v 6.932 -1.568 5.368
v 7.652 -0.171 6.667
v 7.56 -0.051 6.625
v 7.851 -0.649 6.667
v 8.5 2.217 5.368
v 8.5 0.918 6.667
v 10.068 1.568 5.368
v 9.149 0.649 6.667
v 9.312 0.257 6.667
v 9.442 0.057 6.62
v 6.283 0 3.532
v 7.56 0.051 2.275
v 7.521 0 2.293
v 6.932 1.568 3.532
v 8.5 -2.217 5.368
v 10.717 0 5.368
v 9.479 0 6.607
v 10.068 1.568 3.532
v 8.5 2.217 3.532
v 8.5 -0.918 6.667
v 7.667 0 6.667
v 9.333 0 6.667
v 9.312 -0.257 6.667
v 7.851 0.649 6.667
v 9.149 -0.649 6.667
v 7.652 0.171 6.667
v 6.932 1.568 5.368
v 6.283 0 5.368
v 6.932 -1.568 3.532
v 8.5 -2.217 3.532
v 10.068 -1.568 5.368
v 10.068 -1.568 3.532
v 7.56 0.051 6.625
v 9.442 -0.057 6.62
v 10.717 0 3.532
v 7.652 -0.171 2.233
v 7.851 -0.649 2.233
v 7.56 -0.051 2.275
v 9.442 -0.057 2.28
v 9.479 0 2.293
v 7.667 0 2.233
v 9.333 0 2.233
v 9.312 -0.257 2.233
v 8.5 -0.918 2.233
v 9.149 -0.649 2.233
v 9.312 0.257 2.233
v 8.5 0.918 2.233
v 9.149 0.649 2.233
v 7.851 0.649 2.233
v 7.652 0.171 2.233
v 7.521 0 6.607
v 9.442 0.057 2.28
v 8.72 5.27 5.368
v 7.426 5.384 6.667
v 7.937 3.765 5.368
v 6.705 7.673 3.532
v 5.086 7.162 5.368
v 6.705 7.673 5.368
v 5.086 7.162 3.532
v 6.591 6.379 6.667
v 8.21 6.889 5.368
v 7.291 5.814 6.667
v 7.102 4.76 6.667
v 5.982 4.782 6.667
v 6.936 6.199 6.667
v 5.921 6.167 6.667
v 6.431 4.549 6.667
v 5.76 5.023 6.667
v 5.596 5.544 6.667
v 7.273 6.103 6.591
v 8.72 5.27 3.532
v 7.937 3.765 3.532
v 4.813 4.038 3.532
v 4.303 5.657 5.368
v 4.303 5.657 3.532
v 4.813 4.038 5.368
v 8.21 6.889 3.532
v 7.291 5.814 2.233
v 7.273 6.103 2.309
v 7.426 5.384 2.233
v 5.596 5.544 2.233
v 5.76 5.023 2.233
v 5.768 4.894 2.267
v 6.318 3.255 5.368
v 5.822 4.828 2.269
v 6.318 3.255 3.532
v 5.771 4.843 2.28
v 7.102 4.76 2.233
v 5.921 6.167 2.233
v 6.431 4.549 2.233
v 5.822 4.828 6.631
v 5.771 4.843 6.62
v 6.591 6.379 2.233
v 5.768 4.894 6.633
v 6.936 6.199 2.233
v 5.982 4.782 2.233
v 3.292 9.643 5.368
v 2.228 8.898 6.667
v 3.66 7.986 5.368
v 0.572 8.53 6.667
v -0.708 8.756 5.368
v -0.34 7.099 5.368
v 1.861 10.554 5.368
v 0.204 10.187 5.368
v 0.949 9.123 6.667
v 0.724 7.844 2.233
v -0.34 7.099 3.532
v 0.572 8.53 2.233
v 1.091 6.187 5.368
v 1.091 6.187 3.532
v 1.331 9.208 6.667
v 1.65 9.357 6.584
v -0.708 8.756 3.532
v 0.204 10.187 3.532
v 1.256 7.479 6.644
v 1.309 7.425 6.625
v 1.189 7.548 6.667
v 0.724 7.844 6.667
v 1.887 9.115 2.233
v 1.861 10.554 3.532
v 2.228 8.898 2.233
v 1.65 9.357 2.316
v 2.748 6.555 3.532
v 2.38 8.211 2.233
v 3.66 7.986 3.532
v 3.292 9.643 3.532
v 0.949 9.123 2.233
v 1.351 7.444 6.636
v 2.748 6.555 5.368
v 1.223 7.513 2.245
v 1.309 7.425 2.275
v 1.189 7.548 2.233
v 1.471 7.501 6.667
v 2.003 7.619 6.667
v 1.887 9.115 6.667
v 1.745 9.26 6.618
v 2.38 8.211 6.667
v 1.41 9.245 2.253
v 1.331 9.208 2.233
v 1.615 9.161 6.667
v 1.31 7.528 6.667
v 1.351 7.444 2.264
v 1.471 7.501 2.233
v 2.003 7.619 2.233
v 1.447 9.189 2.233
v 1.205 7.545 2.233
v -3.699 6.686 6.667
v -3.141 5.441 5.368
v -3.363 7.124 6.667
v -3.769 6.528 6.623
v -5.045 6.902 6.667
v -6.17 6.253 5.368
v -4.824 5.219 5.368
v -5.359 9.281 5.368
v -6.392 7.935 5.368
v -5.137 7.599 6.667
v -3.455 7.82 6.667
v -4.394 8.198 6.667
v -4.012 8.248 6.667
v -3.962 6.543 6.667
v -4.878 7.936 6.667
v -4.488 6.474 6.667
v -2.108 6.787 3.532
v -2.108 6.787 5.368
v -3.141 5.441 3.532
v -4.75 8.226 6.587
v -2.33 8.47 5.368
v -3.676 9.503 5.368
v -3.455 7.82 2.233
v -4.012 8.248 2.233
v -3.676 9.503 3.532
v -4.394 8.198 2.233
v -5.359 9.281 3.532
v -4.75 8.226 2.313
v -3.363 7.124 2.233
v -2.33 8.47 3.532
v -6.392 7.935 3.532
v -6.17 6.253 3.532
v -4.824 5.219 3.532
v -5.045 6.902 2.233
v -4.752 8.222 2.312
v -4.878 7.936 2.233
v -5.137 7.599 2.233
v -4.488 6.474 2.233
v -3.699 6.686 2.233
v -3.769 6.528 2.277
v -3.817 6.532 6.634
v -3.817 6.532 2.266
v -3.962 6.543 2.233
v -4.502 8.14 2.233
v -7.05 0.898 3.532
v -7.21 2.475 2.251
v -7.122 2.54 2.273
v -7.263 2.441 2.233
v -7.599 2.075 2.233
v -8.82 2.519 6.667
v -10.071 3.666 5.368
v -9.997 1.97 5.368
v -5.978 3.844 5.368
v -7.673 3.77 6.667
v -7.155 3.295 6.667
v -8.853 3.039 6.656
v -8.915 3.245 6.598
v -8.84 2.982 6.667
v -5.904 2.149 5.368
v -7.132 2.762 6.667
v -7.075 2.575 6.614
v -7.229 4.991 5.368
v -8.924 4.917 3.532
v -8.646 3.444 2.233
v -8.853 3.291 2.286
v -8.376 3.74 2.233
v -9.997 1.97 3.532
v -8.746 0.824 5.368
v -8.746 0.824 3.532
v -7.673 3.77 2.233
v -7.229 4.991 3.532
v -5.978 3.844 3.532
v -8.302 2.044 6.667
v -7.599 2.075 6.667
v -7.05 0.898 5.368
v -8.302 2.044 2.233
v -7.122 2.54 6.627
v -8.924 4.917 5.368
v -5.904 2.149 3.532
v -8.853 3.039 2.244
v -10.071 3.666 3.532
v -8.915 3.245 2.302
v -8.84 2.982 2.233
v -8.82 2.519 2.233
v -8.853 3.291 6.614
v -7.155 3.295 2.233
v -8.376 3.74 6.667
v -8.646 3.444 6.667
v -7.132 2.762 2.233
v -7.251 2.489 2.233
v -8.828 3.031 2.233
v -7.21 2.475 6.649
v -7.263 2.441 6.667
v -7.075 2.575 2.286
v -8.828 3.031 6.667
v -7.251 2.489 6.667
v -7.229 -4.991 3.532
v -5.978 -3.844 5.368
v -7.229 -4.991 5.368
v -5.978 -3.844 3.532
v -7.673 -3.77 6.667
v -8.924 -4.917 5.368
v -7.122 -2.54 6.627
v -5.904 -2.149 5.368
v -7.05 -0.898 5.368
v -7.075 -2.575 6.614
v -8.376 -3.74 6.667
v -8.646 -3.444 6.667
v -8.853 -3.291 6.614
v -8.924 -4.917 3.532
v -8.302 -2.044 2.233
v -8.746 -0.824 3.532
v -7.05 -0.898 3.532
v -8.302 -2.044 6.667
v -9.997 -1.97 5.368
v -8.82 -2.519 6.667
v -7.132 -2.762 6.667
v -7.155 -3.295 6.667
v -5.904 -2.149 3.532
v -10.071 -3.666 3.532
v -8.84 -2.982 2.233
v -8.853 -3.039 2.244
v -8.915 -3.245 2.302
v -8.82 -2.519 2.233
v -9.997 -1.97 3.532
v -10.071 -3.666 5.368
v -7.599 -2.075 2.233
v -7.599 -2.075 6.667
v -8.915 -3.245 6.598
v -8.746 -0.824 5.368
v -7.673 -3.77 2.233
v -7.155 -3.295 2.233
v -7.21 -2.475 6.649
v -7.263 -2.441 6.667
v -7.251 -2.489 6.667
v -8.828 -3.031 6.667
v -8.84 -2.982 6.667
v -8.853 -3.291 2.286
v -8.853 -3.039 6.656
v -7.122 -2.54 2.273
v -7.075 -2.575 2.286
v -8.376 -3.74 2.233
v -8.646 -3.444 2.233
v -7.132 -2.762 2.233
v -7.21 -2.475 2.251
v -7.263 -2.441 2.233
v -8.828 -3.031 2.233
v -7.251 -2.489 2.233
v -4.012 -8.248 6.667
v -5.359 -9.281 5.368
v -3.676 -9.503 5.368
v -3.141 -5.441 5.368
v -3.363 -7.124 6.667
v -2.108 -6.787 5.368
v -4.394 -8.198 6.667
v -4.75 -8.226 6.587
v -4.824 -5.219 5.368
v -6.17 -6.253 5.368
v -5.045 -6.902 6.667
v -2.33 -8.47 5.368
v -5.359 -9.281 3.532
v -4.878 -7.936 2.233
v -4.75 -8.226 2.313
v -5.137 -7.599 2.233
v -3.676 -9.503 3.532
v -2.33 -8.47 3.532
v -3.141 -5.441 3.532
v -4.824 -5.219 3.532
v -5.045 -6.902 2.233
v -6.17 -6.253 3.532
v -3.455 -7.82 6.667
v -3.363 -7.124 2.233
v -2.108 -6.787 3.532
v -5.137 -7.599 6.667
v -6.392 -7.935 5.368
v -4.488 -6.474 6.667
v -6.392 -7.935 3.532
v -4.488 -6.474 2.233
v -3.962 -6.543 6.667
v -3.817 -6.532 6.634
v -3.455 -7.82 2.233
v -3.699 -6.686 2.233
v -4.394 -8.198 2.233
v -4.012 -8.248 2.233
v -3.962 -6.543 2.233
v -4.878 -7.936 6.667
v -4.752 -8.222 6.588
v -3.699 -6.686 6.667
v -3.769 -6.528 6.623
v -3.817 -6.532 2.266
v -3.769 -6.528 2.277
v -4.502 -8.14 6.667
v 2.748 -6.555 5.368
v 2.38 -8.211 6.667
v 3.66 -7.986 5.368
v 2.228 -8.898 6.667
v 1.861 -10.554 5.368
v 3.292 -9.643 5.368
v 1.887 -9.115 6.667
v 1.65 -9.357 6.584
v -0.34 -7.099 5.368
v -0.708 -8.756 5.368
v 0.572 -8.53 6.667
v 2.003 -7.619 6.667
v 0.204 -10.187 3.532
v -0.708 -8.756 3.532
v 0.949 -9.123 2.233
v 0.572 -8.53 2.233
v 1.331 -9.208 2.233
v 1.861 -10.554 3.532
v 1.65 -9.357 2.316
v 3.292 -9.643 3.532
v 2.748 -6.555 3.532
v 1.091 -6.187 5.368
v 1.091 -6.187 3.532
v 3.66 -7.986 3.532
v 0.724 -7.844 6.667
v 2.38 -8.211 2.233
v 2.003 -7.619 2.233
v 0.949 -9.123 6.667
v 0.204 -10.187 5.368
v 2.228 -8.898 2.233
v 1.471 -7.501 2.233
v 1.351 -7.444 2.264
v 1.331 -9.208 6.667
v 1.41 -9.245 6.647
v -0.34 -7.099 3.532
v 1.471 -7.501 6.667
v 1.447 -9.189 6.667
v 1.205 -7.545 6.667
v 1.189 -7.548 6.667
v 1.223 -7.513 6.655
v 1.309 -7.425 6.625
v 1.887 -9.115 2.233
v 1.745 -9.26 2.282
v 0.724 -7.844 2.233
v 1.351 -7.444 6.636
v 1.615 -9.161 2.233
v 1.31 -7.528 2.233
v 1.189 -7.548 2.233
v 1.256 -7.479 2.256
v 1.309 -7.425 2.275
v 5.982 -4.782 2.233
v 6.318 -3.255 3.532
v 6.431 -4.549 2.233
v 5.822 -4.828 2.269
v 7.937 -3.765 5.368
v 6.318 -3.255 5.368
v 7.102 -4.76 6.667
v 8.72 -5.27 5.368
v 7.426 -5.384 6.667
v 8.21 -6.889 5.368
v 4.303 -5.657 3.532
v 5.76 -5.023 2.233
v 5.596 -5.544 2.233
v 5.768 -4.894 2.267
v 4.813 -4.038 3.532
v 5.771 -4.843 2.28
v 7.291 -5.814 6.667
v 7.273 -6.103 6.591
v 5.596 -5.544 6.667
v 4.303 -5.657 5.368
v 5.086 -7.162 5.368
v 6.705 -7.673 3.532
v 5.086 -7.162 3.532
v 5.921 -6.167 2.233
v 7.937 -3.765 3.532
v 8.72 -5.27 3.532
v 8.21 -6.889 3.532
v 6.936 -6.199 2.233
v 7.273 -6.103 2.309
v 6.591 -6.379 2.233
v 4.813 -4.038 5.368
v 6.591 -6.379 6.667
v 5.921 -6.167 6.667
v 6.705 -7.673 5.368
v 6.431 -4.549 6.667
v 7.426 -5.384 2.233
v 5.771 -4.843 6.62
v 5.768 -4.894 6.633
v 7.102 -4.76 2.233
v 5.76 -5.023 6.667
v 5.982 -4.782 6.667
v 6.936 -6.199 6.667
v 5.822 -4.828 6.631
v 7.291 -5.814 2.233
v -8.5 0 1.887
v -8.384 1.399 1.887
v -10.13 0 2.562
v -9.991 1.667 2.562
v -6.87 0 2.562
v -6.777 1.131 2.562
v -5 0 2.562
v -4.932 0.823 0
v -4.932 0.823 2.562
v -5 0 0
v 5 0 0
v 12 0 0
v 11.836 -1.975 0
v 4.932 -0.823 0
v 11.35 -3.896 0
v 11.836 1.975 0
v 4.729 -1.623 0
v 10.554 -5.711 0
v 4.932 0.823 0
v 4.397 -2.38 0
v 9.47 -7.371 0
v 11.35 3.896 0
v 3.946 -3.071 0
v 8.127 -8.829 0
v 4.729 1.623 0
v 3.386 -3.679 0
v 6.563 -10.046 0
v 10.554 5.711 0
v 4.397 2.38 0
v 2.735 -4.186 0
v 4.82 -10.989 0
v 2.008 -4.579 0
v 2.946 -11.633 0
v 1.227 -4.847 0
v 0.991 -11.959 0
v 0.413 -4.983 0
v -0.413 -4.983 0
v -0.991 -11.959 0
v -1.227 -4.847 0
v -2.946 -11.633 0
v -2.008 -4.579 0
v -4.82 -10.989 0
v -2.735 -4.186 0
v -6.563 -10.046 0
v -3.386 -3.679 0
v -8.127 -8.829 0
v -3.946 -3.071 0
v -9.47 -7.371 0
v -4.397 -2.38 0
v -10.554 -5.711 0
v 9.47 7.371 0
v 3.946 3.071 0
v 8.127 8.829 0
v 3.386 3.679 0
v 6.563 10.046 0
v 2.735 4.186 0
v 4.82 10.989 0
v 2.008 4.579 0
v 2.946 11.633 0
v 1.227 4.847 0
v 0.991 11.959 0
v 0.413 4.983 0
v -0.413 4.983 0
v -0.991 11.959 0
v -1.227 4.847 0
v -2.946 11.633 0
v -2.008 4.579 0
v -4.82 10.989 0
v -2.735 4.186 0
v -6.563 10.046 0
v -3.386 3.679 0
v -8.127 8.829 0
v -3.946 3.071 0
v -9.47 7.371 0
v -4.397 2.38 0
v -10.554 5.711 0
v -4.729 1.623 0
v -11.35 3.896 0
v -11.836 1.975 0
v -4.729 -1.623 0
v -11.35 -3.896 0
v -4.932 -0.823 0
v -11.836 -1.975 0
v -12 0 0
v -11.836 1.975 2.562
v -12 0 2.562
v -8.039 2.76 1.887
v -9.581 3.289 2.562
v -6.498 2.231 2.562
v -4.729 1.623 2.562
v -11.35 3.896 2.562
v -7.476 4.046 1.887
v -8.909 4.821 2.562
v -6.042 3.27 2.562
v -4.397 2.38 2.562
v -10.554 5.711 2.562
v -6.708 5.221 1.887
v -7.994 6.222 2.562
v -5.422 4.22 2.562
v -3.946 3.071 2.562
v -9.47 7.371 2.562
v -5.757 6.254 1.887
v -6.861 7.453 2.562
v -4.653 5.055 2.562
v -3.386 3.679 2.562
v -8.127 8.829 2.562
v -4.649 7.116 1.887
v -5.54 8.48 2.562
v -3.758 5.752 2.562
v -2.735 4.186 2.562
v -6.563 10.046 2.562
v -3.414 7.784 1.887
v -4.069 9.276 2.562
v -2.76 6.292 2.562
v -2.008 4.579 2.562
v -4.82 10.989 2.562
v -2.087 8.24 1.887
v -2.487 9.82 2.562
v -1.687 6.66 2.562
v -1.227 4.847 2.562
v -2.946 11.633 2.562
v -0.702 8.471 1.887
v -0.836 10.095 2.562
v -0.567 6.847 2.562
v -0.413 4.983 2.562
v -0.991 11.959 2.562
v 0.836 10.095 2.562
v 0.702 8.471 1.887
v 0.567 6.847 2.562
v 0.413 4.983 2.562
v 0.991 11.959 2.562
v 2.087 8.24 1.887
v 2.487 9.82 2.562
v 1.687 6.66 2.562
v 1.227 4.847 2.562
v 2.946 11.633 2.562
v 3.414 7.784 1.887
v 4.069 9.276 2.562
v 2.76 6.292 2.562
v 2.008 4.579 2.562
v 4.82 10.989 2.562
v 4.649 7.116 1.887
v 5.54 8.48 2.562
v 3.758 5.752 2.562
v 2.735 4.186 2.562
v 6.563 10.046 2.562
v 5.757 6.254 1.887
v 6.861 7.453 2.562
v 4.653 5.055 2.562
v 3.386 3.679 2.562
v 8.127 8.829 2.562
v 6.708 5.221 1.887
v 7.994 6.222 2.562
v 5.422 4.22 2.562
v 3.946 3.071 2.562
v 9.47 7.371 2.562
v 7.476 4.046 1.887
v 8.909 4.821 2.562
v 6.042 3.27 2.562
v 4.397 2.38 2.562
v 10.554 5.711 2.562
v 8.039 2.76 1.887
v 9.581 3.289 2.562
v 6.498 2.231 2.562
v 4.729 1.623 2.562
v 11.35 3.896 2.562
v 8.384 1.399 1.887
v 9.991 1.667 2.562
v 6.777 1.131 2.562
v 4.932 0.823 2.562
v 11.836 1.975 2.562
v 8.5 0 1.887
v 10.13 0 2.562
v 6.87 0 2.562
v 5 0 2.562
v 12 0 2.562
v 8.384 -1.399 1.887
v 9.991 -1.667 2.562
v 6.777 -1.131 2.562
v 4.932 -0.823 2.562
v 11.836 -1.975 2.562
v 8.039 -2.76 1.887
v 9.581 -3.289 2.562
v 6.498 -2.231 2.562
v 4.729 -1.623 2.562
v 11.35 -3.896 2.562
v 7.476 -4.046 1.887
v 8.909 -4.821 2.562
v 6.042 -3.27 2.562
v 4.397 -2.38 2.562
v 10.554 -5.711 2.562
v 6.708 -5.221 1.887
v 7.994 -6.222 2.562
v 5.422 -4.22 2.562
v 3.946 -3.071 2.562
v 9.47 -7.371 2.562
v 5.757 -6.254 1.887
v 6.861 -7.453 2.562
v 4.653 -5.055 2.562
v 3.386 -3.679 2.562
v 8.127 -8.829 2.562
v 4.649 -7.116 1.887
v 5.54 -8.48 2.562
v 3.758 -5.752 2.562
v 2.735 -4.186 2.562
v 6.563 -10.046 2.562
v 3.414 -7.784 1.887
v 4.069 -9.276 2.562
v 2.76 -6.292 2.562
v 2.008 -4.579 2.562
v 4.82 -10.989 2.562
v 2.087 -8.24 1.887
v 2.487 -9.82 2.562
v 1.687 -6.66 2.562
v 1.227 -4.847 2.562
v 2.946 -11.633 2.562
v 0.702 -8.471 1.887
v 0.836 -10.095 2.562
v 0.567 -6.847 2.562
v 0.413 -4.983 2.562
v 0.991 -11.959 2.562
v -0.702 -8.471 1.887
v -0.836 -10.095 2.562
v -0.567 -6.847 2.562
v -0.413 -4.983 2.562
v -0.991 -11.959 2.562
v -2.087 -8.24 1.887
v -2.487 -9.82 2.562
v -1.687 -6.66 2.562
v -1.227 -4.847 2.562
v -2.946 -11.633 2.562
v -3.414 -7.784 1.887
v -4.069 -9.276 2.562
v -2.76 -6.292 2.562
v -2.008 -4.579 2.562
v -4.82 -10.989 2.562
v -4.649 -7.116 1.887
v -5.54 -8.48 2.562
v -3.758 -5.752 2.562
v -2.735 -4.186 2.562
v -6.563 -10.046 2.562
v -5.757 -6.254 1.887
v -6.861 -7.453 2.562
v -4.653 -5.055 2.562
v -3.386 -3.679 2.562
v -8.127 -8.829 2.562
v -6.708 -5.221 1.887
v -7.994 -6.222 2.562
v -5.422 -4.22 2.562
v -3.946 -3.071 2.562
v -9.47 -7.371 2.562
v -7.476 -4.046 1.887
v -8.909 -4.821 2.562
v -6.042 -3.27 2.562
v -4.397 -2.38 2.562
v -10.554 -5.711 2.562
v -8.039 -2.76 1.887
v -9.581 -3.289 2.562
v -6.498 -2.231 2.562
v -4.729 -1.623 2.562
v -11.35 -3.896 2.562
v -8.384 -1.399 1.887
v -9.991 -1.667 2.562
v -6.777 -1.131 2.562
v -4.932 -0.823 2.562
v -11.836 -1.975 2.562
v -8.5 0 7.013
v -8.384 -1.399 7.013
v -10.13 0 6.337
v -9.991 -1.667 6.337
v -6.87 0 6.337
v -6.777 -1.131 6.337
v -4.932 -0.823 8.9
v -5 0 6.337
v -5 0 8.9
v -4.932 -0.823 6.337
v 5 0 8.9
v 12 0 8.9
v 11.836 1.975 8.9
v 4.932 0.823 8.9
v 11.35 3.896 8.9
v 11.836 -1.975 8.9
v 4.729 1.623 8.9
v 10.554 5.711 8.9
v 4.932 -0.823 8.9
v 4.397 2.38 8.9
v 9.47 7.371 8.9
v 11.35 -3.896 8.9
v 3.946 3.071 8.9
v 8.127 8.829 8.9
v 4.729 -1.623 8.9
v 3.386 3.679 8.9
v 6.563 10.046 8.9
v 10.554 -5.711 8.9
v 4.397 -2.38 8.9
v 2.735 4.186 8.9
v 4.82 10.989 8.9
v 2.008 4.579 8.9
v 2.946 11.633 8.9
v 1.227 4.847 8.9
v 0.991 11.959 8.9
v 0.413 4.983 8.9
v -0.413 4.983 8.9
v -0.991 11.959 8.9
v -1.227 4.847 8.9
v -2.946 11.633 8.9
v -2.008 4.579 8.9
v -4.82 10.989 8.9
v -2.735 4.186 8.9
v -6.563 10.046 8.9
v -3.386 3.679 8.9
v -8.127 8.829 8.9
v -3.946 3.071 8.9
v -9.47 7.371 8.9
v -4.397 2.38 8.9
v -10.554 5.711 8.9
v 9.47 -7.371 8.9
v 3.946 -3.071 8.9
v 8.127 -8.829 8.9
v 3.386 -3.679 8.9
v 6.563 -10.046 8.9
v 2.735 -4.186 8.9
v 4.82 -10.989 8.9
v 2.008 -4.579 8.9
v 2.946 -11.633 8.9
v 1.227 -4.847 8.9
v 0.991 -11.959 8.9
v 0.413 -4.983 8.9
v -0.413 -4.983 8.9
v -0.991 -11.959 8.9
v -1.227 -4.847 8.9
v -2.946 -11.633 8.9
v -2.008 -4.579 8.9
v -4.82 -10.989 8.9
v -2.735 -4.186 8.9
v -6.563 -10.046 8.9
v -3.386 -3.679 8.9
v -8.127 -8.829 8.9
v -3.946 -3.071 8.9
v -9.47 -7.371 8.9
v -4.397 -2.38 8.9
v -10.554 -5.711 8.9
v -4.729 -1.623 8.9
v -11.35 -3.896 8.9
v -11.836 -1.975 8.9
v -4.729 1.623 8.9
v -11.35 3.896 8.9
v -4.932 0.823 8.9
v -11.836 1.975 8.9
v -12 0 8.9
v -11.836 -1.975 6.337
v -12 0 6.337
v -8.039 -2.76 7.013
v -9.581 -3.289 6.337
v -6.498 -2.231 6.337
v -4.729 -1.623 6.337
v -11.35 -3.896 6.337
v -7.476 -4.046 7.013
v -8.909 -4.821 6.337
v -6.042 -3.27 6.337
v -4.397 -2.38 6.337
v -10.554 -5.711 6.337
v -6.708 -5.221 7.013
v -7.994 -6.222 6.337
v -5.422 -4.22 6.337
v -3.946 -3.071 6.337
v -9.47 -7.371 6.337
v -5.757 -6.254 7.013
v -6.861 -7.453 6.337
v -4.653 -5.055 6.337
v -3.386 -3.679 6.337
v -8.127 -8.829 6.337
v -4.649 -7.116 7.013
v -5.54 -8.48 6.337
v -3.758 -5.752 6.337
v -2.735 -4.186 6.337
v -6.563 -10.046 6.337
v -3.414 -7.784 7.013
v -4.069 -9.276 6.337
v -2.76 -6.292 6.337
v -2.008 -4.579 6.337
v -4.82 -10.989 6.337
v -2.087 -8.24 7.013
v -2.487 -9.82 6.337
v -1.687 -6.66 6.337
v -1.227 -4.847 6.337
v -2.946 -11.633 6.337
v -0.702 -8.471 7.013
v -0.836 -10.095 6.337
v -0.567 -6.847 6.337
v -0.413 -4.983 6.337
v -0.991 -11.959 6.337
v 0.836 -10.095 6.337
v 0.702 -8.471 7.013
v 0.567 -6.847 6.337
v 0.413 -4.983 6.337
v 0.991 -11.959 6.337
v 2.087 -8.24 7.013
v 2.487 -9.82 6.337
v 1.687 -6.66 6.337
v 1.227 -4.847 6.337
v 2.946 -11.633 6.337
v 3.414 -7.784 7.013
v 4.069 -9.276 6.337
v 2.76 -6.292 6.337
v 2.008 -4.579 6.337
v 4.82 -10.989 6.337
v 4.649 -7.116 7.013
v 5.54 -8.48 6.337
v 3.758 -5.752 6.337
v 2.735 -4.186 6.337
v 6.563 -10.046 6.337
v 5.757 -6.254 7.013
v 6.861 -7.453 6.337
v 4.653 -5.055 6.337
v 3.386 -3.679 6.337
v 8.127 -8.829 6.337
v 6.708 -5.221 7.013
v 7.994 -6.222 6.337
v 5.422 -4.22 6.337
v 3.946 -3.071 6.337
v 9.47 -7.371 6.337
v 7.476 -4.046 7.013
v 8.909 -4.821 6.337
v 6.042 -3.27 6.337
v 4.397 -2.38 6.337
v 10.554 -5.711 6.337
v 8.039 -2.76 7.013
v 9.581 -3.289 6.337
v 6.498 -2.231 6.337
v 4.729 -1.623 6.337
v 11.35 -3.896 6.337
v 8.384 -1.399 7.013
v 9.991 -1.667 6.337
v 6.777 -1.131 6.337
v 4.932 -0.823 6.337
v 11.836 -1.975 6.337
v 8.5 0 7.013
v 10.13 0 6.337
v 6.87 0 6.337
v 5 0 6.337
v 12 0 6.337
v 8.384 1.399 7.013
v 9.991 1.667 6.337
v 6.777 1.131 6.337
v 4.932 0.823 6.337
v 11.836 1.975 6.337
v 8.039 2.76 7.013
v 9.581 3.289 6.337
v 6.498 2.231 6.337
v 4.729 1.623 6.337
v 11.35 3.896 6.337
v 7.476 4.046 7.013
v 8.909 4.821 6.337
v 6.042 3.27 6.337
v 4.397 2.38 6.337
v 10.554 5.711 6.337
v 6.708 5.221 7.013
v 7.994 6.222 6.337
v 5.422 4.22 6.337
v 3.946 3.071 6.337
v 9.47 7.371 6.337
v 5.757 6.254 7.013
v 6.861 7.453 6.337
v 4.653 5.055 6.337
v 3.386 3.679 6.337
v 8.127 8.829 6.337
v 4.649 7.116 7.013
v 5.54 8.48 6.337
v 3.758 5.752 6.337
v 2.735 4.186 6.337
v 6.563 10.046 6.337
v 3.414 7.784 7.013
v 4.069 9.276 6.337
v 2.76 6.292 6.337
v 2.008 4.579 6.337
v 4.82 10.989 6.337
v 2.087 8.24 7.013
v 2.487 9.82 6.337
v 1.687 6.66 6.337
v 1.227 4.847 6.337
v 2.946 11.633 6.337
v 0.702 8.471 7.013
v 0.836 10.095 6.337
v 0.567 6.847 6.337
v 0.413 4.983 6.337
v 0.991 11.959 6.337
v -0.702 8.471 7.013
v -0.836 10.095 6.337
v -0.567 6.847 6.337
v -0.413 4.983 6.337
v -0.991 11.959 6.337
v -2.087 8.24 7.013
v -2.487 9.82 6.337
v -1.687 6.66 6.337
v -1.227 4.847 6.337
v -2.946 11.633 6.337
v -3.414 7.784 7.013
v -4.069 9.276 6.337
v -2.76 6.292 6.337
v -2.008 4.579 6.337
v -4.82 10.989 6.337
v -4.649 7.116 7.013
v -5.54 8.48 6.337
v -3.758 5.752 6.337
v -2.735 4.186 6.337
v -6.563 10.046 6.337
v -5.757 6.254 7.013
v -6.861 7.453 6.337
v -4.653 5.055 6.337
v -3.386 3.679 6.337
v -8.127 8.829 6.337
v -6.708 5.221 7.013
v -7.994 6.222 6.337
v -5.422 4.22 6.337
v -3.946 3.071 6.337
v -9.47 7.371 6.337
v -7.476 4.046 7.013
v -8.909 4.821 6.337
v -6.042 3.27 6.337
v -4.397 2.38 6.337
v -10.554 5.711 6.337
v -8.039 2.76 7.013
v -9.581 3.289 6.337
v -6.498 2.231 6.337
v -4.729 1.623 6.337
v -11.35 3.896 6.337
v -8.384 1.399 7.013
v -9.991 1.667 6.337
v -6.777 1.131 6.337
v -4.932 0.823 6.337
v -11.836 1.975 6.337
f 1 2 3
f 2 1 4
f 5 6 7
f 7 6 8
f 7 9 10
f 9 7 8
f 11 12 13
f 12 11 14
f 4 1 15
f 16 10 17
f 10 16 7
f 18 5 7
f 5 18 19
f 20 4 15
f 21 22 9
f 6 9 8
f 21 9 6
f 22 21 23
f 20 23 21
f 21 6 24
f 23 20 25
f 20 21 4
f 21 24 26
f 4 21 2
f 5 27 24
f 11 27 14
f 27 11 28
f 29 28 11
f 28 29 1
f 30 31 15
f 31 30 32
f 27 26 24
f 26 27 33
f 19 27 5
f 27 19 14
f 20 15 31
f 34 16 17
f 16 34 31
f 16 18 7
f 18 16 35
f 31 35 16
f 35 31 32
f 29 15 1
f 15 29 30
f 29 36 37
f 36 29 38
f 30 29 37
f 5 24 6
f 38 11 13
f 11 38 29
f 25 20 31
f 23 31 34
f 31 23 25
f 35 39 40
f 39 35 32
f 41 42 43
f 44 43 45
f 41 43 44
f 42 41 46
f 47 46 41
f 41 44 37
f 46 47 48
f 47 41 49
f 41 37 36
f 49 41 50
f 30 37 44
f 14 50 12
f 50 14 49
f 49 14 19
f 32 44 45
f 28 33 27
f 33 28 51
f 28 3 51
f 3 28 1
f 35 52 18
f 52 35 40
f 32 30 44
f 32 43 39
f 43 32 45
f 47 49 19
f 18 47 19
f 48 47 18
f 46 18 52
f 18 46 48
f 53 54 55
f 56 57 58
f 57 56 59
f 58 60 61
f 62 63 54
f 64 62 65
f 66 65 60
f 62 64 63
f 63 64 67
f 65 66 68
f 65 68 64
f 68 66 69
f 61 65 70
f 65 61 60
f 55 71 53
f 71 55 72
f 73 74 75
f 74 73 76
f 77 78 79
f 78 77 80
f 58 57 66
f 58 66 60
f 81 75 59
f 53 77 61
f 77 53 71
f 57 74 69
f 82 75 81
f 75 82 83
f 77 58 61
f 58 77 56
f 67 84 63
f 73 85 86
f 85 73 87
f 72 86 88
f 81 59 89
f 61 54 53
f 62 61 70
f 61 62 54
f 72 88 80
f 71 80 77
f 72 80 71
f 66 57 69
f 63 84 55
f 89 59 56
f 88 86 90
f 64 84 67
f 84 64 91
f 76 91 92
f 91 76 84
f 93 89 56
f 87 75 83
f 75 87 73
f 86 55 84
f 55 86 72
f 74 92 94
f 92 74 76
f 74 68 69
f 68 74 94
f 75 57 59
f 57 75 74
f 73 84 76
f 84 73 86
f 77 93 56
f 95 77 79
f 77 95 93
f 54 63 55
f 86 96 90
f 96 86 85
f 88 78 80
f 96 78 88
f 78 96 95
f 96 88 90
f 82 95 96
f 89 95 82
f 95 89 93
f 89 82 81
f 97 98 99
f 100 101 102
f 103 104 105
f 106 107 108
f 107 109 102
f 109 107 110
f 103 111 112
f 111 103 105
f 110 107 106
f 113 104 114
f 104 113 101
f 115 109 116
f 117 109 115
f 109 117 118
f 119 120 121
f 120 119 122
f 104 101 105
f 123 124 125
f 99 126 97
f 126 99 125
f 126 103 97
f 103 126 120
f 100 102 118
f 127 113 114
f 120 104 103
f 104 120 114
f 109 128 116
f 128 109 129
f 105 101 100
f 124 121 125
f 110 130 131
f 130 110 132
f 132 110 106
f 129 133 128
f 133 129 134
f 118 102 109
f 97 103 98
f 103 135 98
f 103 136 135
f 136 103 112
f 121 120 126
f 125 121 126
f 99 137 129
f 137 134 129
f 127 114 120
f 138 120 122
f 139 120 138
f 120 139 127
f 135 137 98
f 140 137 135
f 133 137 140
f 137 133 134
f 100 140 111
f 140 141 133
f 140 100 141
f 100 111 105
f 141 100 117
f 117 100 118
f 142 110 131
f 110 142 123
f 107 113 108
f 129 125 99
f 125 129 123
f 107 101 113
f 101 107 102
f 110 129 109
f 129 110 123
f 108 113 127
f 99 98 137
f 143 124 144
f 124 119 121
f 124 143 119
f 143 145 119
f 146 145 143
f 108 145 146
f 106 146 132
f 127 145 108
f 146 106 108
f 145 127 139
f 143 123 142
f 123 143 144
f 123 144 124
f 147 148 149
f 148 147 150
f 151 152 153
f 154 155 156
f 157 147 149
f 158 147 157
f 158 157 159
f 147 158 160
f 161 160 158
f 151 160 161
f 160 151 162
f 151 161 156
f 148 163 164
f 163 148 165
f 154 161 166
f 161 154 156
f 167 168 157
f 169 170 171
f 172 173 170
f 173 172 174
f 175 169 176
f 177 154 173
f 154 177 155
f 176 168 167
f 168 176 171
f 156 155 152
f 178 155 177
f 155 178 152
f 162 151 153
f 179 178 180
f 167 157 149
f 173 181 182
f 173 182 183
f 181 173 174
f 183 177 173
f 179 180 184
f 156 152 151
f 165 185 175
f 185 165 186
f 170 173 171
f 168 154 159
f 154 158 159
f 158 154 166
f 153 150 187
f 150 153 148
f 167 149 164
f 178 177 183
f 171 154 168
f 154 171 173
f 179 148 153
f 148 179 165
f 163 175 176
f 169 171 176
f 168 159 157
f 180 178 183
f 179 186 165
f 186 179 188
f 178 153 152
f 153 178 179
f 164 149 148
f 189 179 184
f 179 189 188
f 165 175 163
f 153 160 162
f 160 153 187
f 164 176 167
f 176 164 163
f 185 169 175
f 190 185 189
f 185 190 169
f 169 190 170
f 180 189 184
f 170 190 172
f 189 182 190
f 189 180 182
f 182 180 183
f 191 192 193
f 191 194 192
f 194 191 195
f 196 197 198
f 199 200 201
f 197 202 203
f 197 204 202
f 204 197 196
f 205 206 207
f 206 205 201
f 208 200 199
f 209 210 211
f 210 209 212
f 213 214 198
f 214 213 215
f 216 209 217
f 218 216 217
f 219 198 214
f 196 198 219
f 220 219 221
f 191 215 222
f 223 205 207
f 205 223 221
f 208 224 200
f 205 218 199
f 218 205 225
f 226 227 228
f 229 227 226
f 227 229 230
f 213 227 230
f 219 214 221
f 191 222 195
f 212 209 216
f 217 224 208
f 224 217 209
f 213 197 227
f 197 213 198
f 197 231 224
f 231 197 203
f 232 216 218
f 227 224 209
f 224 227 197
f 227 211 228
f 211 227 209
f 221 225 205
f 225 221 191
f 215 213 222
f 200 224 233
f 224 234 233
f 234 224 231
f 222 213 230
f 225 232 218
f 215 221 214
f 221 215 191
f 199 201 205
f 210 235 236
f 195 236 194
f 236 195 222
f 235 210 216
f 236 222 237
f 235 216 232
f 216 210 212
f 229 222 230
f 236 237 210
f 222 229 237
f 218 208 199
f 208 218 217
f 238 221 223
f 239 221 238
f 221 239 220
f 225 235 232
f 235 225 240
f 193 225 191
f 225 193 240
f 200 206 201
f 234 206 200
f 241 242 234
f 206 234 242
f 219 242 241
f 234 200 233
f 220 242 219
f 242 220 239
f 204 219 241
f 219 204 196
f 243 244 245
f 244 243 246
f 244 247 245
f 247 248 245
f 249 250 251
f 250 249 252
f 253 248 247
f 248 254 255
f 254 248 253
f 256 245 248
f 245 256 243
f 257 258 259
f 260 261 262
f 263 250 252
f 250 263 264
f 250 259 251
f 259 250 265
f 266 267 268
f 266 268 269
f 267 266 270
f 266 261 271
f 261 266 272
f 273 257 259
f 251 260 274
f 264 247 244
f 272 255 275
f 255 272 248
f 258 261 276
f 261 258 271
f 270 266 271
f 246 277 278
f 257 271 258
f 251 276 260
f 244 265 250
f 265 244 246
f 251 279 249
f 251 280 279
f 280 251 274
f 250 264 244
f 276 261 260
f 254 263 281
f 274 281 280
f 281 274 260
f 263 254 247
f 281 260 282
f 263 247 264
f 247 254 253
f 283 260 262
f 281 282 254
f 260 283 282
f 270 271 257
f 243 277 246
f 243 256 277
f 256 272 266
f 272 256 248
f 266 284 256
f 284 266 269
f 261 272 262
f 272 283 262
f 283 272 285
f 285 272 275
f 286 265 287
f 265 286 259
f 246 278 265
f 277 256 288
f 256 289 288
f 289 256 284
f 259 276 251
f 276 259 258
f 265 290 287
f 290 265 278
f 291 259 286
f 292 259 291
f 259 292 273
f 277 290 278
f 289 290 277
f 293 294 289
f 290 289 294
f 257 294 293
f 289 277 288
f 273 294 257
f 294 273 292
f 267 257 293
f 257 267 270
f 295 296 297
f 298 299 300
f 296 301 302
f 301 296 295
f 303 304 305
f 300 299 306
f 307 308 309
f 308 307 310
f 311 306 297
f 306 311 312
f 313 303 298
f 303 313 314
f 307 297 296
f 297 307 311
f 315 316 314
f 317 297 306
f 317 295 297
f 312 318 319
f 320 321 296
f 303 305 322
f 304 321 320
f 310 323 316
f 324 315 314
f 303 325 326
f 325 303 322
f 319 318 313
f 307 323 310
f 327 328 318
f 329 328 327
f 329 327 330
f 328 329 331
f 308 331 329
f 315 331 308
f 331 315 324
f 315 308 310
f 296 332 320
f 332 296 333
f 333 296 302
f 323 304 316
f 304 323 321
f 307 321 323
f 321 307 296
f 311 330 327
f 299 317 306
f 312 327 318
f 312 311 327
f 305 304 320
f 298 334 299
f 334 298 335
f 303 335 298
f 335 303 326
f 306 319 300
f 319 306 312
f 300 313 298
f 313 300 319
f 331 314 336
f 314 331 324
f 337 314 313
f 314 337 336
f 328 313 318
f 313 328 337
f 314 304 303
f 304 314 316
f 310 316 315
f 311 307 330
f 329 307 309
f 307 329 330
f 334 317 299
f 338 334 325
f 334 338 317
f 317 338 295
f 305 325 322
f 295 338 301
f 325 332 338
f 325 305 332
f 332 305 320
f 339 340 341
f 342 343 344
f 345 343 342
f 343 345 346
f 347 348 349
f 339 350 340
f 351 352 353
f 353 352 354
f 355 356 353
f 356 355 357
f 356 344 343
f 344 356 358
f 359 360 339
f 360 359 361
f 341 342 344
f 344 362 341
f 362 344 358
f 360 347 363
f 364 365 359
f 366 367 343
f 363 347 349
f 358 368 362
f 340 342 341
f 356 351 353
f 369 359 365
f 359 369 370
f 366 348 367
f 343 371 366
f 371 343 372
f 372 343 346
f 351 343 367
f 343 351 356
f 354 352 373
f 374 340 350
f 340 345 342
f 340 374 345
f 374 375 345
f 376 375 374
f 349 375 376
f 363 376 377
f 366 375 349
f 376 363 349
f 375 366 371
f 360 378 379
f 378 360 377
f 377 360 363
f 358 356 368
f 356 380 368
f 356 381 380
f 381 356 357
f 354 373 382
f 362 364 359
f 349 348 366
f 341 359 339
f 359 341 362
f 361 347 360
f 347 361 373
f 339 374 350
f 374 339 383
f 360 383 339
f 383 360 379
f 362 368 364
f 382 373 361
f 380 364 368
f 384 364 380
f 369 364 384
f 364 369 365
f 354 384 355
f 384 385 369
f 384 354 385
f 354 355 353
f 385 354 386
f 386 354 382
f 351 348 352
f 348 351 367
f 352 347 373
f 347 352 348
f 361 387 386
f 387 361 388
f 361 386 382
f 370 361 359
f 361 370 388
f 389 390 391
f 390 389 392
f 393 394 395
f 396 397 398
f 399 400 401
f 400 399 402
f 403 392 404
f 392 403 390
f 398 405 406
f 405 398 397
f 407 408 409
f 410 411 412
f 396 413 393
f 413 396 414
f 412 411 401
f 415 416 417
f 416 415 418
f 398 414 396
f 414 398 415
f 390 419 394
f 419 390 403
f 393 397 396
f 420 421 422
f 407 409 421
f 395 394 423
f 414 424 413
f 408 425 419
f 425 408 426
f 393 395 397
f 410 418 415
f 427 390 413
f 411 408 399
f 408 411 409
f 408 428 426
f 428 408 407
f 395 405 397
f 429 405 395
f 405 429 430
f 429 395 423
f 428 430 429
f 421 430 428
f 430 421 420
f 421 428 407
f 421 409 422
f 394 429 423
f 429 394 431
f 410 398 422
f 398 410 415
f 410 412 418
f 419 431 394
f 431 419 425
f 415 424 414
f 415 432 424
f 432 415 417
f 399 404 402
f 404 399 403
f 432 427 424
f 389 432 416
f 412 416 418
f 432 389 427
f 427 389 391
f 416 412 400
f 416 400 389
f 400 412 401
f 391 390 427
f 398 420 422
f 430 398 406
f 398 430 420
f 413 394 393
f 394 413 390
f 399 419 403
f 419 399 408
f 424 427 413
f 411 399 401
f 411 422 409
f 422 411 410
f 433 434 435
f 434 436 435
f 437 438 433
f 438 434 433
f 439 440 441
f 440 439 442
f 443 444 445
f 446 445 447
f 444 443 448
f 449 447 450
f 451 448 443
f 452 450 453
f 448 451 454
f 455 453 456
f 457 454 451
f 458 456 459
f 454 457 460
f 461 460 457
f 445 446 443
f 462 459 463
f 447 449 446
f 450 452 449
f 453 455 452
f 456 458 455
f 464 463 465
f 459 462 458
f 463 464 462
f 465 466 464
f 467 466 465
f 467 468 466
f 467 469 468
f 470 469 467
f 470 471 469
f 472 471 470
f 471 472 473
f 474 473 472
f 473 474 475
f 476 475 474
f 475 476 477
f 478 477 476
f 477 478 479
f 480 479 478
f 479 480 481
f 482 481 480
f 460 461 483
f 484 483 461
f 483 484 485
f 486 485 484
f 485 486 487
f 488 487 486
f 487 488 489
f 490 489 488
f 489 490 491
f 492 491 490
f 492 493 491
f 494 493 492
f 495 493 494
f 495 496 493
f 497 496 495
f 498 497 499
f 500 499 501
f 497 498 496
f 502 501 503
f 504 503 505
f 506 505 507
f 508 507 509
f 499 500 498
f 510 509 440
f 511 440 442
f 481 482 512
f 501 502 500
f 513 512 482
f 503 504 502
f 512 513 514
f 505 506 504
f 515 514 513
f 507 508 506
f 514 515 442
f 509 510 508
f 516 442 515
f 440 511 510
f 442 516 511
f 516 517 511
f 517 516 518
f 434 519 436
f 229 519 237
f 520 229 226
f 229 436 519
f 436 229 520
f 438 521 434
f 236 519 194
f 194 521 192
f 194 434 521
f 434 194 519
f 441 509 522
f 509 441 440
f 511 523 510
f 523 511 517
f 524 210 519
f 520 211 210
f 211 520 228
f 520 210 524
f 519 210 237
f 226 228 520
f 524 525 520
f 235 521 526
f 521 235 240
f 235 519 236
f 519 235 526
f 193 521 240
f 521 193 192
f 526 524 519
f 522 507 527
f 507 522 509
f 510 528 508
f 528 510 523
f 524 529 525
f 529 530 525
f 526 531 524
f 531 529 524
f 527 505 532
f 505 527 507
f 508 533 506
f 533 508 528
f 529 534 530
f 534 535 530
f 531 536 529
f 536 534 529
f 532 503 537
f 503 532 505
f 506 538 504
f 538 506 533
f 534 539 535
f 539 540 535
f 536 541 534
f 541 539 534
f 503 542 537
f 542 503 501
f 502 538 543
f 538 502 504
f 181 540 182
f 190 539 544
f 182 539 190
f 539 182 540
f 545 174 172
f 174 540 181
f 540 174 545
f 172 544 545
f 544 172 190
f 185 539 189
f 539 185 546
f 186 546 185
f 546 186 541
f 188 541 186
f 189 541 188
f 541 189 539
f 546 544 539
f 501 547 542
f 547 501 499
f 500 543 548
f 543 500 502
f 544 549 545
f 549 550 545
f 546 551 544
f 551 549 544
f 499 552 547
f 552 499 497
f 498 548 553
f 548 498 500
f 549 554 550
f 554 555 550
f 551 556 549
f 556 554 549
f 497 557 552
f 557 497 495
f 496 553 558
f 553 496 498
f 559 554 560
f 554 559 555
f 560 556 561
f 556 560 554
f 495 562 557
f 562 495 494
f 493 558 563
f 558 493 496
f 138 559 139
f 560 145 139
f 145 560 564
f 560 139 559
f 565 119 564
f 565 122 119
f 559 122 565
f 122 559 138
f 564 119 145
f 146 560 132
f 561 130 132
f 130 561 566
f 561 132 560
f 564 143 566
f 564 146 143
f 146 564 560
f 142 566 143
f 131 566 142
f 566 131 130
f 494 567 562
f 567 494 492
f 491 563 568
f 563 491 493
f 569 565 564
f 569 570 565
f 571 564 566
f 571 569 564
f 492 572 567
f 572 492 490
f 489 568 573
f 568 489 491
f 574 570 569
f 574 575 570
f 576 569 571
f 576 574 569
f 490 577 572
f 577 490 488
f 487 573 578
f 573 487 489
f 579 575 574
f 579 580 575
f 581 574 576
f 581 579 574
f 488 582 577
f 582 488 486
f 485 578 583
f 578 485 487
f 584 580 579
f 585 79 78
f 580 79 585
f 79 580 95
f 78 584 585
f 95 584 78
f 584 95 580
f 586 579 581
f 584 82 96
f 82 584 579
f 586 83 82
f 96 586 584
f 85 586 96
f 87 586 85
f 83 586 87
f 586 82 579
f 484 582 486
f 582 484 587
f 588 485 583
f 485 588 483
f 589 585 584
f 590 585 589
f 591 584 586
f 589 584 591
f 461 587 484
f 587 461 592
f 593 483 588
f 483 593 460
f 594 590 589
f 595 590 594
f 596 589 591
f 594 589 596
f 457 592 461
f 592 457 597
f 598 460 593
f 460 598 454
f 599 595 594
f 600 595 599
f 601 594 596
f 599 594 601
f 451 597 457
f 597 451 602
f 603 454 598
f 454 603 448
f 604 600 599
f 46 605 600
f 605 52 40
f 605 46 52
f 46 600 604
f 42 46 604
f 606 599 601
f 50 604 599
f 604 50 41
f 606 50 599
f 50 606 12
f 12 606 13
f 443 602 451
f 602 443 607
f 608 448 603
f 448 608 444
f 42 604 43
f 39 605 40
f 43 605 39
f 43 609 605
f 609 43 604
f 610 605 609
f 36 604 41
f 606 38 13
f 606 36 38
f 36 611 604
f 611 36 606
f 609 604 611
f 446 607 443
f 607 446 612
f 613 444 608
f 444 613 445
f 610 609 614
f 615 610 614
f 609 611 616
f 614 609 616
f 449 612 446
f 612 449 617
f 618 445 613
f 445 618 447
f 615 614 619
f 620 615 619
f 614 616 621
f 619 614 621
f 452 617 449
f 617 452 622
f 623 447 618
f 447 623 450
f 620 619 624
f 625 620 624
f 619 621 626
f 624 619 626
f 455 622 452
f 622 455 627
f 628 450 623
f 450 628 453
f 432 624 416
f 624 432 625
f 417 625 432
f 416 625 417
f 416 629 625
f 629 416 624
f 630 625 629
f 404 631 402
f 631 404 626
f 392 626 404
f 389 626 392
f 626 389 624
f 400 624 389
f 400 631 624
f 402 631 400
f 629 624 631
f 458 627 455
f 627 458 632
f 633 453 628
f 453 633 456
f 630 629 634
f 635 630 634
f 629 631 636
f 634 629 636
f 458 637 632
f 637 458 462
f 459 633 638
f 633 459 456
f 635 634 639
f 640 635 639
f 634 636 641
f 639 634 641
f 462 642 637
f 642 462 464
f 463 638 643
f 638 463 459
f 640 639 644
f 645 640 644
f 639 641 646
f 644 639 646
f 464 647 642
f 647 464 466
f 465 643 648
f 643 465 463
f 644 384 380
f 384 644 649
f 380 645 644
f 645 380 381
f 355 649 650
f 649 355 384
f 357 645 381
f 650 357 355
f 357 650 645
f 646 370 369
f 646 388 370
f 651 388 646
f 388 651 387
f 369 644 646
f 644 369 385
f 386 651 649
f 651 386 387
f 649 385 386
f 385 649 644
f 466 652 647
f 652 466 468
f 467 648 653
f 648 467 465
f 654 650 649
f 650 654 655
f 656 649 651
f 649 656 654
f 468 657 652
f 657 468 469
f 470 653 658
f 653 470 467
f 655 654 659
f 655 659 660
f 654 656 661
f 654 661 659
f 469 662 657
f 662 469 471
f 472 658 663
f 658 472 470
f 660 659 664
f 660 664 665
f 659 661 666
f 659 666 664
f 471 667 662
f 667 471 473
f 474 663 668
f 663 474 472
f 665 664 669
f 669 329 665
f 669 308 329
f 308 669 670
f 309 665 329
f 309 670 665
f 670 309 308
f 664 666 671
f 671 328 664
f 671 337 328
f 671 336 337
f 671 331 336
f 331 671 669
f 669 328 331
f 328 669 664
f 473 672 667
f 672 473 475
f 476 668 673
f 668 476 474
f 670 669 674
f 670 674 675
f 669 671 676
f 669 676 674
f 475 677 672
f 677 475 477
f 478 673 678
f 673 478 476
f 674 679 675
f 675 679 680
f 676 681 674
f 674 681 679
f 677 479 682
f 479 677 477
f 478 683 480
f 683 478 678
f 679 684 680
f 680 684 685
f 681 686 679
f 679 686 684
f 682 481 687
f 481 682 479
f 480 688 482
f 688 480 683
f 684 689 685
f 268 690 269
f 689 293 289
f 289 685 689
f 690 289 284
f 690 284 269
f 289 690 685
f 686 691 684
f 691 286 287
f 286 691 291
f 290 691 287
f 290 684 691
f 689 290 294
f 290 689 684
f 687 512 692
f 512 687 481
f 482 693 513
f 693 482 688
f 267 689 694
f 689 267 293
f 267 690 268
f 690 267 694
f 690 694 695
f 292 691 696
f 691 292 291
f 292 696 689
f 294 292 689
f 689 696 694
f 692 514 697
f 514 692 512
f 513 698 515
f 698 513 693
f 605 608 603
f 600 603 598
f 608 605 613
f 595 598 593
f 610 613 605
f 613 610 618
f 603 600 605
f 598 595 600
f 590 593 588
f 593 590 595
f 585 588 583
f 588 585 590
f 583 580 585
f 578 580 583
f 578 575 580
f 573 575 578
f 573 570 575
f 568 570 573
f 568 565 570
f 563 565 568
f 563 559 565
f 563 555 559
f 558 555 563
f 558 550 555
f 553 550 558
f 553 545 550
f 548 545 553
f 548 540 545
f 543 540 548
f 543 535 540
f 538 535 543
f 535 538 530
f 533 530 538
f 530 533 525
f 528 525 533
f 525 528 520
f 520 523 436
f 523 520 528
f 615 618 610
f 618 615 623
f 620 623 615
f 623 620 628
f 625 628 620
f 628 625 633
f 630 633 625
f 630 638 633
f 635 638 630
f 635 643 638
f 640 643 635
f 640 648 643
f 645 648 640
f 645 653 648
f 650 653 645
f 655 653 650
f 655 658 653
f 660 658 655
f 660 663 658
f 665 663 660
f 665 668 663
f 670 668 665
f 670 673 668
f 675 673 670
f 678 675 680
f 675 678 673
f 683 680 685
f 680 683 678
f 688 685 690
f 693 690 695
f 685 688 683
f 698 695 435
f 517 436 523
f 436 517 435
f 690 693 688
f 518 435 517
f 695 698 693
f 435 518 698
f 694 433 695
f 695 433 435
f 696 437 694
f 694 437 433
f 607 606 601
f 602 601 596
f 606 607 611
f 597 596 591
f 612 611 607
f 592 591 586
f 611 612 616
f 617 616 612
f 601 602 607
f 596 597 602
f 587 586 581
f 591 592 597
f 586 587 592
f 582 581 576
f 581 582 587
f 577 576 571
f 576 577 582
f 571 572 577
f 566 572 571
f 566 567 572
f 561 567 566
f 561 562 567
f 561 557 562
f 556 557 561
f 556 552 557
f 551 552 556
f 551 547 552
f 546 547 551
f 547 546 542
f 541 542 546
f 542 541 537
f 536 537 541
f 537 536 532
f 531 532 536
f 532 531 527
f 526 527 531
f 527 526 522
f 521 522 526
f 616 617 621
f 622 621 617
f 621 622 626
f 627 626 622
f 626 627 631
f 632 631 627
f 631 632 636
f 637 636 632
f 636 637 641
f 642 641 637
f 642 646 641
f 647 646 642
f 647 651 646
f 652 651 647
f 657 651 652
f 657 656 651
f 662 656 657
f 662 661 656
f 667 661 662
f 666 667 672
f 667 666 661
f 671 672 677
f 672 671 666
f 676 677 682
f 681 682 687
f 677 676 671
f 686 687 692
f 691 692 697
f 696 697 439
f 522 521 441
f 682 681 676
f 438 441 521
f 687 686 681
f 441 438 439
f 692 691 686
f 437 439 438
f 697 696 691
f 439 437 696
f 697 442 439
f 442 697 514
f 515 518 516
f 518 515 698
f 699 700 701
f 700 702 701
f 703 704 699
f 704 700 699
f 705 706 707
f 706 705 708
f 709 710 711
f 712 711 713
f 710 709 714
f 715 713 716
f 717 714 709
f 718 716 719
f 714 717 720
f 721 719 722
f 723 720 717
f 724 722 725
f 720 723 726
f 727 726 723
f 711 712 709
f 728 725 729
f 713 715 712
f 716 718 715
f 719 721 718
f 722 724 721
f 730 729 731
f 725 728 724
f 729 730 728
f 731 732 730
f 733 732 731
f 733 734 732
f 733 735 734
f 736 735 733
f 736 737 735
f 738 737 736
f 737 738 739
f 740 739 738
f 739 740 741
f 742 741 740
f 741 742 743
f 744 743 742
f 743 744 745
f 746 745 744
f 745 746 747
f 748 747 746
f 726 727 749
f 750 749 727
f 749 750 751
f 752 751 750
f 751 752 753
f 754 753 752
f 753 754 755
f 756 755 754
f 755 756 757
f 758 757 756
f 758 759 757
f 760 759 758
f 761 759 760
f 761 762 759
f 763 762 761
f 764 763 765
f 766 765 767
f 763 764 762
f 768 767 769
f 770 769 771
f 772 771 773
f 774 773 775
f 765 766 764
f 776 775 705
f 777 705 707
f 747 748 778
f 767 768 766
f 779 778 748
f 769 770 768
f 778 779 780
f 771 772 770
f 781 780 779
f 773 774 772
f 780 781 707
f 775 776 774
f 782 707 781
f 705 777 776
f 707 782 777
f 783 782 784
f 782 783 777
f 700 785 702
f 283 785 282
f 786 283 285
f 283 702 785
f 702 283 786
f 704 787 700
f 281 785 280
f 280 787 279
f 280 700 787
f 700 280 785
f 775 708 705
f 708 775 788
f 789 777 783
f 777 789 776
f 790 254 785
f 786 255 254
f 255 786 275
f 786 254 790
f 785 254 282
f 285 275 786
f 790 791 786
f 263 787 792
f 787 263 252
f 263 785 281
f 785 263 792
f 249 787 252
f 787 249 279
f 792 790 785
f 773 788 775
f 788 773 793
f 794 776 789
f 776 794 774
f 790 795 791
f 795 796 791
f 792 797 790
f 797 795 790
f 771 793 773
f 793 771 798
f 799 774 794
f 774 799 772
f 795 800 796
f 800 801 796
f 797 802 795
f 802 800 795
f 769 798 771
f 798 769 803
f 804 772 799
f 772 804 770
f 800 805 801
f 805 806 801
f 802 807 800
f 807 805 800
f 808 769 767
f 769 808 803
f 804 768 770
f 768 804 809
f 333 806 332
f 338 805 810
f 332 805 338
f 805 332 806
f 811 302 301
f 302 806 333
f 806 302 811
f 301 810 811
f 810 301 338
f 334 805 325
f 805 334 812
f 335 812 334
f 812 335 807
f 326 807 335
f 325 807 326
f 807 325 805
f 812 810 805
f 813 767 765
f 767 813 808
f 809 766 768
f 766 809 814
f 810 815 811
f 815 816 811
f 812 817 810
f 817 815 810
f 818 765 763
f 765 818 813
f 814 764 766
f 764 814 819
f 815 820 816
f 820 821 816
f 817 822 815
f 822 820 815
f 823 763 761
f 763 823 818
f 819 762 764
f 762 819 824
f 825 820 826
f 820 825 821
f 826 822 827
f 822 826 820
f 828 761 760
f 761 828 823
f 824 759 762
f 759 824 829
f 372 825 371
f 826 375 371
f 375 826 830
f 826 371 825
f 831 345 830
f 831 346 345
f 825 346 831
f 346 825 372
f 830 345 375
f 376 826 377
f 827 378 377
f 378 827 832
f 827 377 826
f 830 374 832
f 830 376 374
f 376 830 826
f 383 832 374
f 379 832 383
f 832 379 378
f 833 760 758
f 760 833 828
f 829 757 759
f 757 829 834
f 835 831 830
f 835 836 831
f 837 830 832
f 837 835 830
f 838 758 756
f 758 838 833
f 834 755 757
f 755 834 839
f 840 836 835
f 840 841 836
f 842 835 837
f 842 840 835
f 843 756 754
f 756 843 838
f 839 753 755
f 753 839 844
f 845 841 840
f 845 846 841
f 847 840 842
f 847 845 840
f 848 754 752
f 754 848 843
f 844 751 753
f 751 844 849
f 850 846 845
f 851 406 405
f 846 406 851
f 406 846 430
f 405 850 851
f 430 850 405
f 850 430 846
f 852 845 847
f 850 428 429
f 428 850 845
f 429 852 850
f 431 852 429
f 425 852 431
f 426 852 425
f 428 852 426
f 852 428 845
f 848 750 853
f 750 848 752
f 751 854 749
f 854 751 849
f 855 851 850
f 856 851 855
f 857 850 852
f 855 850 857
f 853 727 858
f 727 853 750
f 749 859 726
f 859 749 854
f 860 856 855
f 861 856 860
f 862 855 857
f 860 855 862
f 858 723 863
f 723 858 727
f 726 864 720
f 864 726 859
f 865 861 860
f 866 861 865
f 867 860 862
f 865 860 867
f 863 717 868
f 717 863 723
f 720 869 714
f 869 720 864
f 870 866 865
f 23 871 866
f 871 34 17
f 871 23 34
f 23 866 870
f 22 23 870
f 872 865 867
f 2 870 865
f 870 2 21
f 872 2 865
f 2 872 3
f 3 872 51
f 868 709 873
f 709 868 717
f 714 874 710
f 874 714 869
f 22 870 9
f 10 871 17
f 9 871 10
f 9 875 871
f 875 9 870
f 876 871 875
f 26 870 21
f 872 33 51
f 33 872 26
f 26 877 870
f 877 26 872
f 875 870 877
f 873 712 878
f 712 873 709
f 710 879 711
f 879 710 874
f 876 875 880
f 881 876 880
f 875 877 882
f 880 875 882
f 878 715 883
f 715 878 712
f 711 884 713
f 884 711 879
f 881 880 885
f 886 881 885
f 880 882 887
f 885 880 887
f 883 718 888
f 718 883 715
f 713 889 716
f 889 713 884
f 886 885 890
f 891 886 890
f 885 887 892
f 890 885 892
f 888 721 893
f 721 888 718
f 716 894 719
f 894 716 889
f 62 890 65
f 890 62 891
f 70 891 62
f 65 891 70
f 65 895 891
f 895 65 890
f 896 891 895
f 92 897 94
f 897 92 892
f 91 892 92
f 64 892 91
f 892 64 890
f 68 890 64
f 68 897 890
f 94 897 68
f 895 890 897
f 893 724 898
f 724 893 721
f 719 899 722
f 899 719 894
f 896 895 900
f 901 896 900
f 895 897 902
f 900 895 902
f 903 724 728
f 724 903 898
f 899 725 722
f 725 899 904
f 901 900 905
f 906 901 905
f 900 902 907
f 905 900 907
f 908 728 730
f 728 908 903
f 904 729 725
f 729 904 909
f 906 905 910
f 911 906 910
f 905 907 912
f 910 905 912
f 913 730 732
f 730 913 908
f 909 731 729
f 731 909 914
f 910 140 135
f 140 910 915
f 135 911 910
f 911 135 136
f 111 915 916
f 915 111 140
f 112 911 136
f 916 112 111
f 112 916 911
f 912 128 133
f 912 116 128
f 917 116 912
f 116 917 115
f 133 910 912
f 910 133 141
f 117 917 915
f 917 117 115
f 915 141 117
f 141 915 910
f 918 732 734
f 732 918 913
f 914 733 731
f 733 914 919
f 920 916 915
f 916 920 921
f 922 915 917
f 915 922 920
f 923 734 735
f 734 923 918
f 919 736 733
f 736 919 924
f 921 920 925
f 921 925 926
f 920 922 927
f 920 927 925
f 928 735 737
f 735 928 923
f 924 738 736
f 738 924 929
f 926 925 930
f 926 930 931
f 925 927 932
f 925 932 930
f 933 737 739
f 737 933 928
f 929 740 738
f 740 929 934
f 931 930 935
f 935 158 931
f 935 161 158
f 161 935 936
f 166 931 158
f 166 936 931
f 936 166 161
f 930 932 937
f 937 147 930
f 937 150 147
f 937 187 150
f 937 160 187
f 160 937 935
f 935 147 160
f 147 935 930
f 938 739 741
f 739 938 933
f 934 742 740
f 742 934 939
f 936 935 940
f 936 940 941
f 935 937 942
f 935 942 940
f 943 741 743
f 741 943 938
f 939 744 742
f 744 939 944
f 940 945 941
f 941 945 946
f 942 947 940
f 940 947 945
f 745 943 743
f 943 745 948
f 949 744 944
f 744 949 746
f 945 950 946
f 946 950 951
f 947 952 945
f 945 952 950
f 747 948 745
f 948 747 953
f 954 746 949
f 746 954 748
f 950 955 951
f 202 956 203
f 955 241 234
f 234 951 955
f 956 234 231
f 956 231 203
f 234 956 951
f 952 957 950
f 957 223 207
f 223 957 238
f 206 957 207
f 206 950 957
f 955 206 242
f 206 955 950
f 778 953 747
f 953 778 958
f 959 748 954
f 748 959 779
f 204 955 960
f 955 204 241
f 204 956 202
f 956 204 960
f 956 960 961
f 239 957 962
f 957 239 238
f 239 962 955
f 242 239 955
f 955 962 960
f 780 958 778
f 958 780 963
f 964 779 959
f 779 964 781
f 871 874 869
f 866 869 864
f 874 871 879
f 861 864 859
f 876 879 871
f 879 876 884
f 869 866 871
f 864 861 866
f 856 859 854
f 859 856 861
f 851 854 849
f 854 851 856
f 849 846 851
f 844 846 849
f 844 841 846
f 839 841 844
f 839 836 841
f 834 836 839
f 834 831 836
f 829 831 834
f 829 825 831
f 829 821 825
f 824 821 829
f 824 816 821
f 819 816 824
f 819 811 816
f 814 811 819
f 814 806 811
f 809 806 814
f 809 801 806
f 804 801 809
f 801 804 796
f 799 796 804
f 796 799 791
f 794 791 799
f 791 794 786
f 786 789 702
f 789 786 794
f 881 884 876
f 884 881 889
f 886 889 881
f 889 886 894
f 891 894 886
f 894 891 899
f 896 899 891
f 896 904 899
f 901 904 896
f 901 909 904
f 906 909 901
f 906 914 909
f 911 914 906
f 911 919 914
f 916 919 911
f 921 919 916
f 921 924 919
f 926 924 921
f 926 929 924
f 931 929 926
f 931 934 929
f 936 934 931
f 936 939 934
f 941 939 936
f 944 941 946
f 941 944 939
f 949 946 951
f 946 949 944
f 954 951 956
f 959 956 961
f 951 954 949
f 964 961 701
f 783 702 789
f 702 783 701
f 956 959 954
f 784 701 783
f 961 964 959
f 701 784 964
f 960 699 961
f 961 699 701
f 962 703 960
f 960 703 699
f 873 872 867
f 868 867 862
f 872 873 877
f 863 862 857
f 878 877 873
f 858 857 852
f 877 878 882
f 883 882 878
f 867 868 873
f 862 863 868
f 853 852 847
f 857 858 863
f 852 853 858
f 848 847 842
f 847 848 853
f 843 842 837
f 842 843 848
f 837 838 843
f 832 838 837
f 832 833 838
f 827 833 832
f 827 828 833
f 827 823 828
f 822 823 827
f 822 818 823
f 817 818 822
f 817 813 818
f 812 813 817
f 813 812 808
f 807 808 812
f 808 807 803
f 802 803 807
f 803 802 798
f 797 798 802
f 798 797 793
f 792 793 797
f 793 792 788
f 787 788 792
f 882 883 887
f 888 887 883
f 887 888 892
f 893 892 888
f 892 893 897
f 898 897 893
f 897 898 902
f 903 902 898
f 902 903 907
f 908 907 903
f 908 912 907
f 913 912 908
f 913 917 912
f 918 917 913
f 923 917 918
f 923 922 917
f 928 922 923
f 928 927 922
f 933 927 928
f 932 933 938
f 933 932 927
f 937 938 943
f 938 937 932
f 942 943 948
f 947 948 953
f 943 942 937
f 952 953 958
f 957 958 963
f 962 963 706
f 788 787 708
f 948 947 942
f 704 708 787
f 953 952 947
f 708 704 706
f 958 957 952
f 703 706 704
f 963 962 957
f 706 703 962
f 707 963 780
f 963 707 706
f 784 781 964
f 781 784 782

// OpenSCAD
// file: ../machine.scad
/*
 * Helpers for machinging; i.e. kerf alowances
 *
 * Copyright 2013 <b@Zi.iS>
 * License CC BY 3.0
 */

include <main.scad>;

ZCUT = 0;
XOFF = 0;
YOFF = 0;

module drawing() {
	//create blueprint
	if(preview==0) {
		projection(cut=true) translate([
			XOFF,
			YOFF,
			ZCUT
		]) {
			for(i=[0:$children-1]) child(i);
		}
	} else {
		for(i=[0:$children-1]) child(i);
	}
}

module kerf_cube(
	size
) {
	translate([
		kerf/2*(1-preview),
		kerf/2*(1-preview),
		0
	]) {
		cube([
			size[0] - kerf*(1-preview),
			size[1] - kerf*(1-preview),
			size[2]
		]);
	}
}

module kerf_cylinder(
	r,
	h
) {
	cylinder(
		r = r - kerf/2*(1-preview),
		h = h
	);
}

module part(
	id,
	name
) {
	if(PART<1 || PART==id) {
		echo(str("PART", id, ":", name));
		for(i=[0:$children-1]) child(i);
	}	
}
// file: ../easing.scad
/*
 * Make allowances to ensure good fit.
 *
 * Copyright 2013 <b@Zi.iS>
 * License CC BY 3.0
 */

function ease(value) = min(value*1.1, value + .2);
// file: ../epslion.scad
/*
 * Slightly offset previews to overcome rounding issues
 *
 * Copyright 2013 <b@Zi.iS>
 * License CC BY 3.0
 */

include <config.scad>;

module e(
	shift = -.1,
	size = 1.1
) {
	if(preview == 1) {
		translate([
			0,
			0,
			shift
		]) {
			scale([
				1,
				1,
				size
			]) {
				if($children>0) for (i = [0 : $children-1]) child(i);
			}
		}
	} else {
		if($children>0) for (i = [0 : $children-1]) child(i);
	}
}
// file: ../config.scad
/*
 * Default settings
 *
 * Copyright 2013 <b@Zi.iS>
 * License CC BY 3.0
 */

preview = 1;
$fa = 6;
$fs = 2 - 1.5*(1-preview);
kerf = .2;
PART = 0; //all

// preview colors
color_steel = [.8, .8, .8];
color_wood = [.3, .3, 0];
color_print = [0, .8, 0];
color_plastic = [.7, 1, .7];
color_brass = [181/255, 166/255, 66/255];
// file: ../main.scad
/*
 * A library to make SCAD easier.
 *
 * Copyright 2013 <b@Zi.iS>
 * License CC BY 3.0
 */

include <config.scad>;
use <epslion.scad>;
use <easing.scad>;
use <machine.scad>;
// main file
/*
 * thrust bearing
 *
 * Copyright 2013 <b@Zi.iS>
 * License CC BY 3.0
 */

include <../main.scad>;

thrust_bearing();

thrust_bearing = [
	[],
	[],
	[],
	[],
	[],
	[],
	[],
	[],
	[],
	[],
	[
		10,
		24,
		8.9,
		4.8
	]
];		

module thrust_bearing(
	size = 10,
	id
) {
	part(id, str("Thrust bearing: ID", thrust_bearing[size][0], "mm, OD", thrust_bearing[size][1], "mm, width", thrust_bearing[size][2], "mm"))
	color(color_steel) {
	rotate_extrude() {
		translate([
			thrust_bearing[size][0]/2,
			0,
			0
		]) {
			difference() {
				square([
					(thrust_bearing[size][1] - thrust_bearing[size][0])/2,
					(thrust_bearing[size][2] - thrust_bearing[size][3])/2*1.25
				]);
				translate([
					(thrust_bearing[size][1] - thrust_bearing[size][0])/2/2,
					thrust_bearing[size][3]
						- (thrust_bearing[size][2] - thrust_bearing[size][3])/2*1.25
						+ (thrust_bearing[size][2] - thrust_bearing[size][3])/2,
					0
				]) {
					circle(r = thrust_bearing[size][3]/2);
				}
			}
		}
	}
	translate([
		0,
		0,
		(thrust_bearing[size][2] - thrust_bearing[size][3])/2 + thrust_bearing[size][3]/2 
	]) {
		for(i=[0:8]) {
			rotate([
				0,
				0,
				360/9*i
			]) {
				translate([
					thrust_bearing[size][0]/2 + (thrust_bearing[size][1] - thrust_bearing[size][0])/2/2,
					0,
					0,
				]) {
					sphere(
						r = thrust_bearing[size][3]/2
					);
				}
			}
		}
	}
	translate([
		0,
		0,
		thrust_bearing[size][2]
	]) {
		rotate([
			180,
			0,
			0
		]) {
			rotate_extrude() {
				translate([
					thrust_bearing[size][0]/2,
					0,
					0
				]) {
					difference() {
						square([
							(thrust_bearing[size][1] - thrust_bearing[size][0])/2,
							(thrust_bearing[size][2] - thrust_bearing[size][3])/2*1.25
						]);
						translate([
							(thrust_bearing[size][1] - thrust_bearing[size][0])/2/2,
							thrust_bearing[size][3]
								- (thrust_bearing[size][2] - thrust_bearing[size][3])/2*1.25
								+ (thrust_bearing[size][2] - thrust_bearing[size][3])/2,
							0
						]) {
							circle(r = thrust_bearing[size][3]/2);
						}
					}
				}
			}
		}
	}
    }
	translate([
		0,
		0,
		thrust_bearing[size][2]
	] * preview) {
		if($children>0) for (i = [0 : $children-1]) child(i);
	}
}
